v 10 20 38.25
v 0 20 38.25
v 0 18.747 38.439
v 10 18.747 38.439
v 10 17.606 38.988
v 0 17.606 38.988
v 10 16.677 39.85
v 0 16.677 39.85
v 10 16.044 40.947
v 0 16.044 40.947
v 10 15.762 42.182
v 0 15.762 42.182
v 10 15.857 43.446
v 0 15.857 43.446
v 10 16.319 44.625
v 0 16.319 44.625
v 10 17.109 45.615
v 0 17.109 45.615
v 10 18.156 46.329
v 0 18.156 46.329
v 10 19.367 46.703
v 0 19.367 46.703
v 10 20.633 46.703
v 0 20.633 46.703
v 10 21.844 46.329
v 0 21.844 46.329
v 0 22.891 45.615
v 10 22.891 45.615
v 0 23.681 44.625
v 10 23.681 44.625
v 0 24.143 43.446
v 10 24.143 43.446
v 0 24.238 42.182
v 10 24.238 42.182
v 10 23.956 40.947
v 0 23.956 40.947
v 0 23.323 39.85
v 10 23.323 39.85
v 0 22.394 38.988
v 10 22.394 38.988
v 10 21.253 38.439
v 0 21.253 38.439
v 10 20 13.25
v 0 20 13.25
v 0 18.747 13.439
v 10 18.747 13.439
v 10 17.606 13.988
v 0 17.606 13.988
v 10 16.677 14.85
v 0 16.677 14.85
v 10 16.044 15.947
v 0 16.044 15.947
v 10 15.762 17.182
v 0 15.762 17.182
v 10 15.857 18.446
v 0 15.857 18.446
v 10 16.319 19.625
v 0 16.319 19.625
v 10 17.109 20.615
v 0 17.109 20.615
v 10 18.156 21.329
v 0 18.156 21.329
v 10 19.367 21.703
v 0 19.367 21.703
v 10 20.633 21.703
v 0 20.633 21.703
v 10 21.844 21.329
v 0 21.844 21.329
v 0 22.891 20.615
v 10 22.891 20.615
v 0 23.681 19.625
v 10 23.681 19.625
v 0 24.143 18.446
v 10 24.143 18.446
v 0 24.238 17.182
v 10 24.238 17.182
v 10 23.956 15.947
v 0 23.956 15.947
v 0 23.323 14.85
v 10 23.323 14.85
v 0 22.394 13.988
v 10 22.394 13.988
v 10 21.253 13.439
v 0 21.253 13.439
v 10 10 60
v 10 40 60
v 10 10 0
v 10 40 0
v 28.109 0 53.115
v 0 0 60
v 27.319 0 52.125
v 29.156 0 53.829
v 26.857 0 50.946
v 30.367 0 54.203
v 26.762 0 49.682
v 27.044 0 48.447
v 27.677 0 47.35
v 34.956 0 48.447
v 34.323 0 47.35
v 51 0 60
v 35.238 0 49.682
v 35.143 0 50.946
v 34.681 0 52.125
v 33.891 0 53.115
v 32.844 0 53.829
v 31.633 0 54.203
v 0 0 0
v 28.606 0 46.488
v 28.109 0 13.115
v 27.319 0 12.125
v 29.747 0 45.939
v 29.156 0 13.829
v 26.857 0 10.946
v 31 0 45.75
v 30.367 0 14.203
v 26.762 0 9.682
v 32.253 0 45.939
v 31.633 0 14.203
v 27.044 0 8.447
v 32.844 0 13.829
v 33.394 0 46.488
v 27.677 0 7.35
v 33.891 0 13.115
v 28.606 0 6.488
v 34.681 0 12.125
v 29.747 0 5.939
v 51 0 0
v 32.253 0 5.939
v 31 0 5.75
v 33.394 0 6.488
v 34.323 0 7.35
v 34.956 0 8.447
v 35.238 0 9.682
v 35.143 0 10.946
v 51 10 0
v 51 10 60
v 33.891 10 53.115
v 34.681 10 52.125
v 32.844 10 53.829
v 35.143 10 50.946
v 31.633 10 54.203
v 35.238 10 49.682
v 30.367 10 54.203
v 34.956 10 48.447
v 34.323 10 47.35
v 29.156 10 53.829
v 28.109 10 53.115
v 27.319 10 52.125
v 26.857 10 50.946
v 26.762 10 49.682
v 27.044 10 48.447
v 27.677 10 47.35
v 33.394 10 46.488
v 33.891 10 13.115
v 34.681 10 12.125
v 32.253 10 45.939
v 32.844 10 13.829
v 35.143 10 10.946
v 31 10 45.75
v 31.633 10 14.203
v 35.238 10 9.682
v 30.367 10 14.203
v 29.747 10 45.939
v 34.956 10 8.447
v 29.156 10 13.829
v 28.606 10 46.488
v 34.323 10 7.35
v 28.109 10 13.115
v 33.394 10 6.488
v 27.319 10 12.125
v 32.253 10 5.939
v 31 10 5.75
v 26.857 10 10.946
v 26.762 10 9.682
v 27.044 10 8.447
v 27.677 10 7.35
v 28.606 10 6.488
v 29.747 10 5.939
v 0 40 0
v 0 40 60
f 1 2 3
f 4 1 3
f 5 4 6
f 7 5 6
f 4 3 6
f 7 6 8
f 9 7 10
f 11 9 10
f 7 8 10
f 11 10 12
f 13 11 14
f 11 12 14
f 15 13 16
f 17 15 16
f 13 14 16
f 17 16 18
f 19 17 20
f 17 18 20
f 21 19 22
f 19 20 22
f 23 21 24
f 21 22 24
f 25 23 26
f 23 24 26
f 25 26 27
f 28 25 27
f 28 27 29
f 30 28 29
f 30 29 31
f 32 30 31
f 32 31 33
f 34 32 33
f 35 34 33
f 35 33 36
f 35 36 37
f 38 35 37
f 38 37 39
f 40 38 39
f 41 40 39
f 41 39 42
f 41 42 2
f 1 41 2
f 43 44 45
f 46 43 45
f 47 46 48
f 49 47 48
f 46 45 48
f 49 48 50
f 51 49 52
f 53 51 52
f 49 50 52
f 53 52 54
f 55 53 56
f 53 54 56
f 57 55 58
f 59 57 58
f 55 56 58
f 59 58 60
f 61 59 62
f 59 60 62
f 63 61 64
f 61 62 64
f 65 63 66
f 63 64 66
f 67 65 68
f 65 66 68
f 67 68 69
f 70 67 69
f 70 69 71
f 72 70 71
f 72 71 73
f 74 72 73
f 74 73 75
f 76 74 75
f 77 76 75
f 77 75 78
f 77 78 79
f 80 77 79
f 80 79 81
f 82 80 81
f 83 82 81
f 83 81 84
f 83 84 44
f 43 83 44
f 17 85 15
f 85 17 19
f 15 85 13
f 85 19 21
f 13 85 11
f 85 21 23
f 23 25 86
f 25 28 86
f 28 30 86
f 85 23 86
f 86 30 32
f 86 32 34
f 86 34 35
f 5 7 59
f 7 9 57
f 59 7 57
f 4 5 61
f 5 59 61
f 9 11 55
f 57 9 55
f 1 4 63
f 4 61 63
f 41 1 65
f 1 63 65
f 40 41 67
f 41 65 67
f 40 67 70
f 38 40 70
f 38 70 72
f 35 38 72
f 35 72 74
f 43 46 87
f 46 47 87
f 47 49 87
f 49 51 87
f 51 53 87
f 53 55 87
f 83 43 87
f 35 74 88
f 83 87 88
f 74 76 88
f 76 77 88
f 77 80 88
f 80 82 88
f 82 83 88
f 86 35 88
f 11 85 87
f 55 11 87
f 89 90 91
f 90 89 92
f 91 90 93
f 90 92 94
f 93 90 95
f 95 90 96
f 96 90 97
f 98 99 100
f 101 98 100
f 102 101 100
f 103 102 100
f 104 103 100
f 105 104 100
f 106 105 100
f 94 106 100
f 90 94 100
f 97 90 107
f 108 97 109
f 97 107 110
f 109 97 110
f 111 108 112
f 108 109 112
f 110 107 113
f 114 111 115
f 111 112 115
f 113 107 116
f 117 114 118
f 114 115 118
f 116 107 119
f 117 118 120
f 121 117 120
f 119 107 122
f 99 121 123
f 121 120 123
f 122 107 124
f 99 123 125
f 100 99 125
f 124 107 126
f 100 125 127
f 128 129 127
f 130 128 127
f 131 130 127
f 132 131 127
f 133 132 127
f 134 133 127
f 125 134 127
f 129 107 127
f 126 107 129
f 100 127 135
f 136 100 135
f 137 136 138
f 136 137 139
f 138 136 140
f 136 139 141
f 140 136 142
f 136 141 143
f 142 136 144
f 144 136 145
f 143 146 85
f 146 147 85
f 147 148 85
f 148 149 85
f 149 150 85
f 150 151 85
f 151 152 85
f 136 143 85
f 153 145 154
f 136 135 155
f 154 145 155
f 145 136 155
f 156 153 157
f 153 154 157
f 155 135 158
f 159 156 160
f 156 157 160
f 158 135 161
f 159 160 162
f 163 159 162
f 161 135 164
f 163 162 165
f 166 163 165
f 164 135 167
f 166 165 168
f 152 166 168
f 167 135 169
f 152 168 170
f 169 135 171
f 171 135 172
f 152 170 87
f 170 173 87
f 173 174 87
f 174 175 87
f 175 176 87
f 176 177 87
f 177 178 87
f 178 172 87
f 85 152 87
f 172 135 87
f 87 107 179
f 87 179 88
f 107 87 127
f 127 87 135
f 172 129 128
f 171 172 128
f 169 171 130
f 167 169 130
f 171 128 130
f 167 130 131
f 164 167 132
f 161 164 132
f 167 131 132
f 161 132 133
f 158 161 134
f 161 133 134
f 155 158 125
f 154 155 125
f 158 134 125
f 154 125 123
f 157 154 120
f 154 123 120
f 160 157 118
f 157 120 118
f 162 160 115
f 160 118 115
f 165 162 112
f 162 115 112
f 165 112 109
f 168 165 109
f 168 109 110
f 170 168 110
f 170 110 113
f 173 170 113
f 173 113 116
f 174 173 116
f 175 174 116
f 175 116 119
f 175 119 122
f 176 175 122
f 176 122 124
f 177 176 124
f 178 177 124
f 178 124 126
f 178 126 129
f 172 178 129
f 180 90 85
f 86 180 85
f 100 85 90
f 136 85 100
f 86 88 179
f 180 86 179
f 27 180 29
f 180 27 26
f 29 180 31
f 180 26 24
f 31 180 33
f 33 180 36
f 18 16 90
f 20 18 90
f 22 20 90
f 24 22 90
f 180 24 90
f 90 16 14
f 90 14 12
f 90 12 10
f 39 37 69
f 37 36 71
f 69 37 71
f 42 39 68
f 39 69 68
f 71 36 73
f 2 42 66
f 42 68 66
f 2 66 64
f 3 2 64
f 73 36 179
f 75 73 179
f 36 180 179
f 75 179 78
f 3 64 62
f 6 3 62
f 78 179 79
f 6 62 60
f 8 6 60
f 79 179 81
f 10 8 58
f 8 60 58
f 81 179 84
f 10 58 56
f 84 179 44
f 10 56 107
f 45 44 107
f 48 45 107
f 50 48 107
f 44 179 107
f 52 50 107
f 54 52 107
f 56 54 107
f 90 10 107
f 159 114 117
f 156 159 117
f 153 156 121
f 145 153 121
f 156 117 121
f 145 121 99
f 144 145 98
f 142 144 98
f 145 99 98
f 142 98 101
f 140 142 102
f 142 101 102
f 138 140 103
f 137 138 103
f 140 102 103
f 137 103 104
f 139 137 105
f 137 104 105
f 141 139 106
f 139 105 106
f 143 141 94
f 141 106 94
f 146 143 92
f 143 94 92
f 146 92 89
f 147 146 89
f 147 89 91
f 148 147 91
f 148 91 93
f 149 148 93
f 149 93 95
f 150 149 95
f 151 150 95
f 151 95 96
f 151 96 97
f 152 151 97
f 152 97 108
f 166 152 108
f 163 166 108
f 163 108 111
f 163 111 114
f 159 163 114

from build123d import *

# Parameters (mm, degrees)
EXTRUDE_1_DEPTH                   = 60
HOLE_WIZARD_8_5_8_5_1_D           = 8.5
HOLE_WIZARD_8_5_8_5_1_ON_FACE_2_D = 8.5


with BuildPart() as part:
    # 草图1 → 凸台-拉伸1 (new body)
    with BuildSketch(Plane.XY):
        Polygon((0, 40), (0, 0), (51, 0), (51, 10), (10, 10), (10, 40), align=None)
    extrude(amount=EXTRUDE_1_DEPTH)

    # Ø8.5 (8.5) 直径孔1 (through all)
    with Locations(Plane(origin=(10, 20, 42.5), x_dir=(0, 0, 1), z_dir=(1, 0, 0))):
        with Locations((0, 0), (-25, 0)):
            Hole(HOLE_WIZARD_8_5_8_5_1_D / 2)

    # Ø8.5 (8.5) 直径孔1 on face 2 (through all)
    with Locations(Plane(origin=(31, 10, 50), x_dir=(0, 0, 1), z_dir=(0, 1, 0))):
        with Locations((0, 0), (-40, 0)):
            Hole(HOLE_WIZARD_8_5_8_5_1_ON_FACE_2_D / 2)


solid = part.part
